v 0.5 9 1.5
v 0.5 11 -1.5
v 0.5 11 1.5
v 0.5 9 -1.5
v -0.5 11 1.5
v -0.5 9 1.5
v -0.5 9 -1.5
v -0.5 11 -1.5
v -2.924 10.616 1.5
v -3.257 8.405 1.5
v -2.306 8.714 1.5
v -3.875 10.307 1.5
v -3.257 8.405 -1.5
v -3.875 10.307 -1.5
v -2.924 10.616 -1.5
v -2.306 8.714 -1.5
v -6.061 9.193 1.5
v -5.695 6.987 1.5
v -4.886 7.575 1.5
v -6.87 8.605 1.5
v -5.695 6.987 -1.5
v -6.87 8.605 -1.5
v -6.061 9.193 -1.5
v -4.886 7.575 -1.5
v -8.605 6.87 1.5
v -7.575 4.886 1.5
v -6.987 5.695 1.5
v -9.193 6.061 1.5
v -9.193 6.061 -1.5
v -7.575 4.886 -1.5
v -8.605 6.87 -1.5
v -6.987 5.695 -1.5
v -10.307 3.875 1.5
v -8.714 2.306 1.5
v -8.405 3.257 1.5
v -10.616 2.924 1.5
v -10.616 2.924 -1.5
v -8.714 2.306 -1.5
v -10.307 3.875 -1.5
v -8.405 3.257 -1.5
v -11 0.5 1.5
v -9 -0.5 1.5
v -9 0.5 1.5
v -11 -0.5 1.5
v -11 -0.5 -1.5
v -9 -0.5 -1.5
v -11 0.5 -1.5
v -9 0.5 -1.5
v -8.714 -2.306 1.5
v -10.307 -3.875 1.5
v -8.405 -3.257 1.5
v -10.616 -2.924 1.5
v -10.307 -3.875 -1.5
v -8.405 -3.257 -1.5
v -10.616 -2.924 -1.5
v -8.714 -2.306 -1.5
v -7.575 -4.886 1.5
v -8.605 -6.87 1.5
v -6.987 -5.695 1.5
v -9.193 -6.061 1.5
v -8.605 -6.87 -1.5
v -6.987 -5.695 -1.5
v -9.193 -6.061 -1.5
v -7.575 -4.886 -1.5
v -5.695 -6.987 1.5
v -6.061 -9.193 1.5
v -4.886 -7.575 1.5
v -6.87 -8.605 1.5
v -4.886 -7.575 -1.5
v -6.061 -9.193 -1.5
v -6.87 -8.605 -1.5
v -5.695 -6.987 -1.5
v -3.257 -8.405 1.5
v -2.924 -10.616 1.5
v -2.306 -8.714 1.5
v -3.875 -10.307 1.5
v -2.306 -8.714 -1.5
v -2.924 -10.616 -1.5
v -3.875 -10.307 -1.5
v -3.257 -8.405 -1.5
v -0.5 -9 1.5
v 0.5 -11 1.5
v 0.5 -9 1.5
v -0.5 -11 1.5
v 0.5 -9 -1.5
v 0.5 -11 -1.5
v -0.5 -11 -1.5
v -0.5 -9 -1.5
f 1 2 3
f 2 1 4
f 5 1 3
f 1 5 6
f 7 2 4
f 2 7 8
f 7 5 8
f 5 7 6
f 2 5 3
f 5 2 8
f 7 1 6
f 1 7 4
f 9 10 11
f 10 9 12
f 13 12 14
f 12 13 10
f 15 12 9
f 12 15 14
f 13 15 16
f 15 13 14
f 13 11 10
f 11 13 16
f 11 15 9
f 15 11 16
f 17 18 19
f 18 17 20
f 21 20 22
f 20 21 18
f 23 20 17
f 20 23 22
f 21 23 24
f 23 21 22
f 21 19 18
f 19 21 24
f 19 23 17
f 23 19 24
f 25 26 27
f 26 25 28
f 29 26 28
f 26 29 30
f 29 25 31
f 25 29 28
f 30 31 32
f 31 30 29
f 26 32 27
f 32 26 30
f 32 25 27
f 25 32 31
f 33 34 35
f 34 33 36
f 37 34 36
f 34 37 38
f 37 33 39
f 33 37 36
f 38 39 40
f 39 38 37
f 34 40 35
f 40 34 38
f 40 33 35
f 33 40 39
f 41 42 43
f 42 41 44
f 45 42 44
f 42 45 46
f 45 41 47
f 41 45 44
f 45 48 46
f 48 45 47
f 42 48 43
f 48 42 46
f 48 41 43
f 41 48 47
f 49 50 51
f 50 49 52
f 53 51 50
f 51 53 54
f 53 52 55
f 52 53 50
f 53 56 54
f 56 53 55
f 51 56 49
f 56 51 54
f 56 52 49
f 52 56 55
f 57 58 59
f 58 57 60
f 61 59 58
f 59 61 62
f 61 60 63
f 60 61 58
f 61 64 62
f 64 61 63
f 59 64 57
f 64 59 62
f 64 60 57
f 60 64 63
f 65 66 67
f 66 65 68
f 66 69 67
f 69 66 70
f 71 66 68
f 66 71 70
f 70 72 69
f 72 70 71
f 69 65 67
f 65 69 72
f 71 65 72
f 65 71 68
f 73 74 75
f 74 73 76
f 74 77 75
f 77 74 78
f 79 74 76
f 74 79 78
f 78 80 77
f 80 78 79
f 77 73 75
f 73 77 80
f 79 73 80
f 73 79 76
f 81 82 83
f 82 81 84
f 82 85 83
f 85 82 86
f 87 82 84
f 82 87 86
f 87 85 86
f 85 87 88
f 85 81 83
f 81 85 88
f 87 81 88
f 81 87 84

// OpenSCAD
 
 
 num = 10;
 
 for(ii = [0 : 180/num : 180]){

     rotate([0,0,ii])     
     translate([0,10,00])
     cube([1,2,3],true);
     
 }
